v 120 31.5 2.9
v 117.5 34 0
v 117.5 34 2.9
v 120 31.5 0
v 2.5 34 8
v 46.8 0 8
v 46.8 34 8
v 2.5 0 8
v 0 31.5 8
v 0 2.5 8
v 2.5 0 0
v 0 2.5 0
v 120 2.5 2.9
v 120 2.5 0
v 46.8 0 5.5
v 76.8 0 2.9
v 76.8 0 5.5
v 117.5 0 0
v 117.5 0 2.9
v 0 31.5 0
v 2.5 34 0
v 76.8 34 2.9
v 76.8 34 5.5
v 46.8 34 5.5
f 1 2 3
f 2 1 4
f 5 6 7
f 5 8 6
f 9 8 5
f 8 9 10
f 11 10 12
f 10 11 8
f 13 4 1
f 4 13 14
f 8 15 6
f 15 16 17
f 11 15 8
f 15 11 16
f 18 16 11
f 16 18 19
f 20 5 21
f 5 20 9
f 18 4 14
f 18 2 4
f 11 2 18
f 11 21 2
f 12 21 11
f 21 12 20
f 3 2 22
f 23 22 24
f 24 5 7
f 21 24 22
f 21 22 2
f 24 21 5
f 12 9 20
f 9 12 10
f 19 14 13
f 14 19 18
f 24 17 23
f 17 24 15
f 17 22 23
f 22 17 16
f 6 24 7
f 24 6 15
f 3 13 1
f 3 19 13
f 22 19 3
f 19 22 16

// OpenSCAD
$fn = 32;

// ----------------------------------------------------------------------
// Stepped bar: twostep, 120 x 34 x 8/2.9 mm
// ----------------------------------------------------------------------

// --- parameters (mm) ---
bar_l = 120;              // bar length, X
bar_w = 34;               // bar width, Y
plate_t = 8;              // thickness of the thick zone, Z
thin_t = 2.9;             // thickness of the thin zone
corner_c = 2.5;           // corner chamfer of the bar
step_cut = 5.1;           // material removed from the thin zone
stair1_x = 46.8;          // position of the first stair
stair2_x = 76.8;          // position of the second stair
mid_t = 5.5;              // thickness of the middle zone
depth_1 = 2.5;            // depth of cut 1 from the top face
depth_2 = 5.1;            // depth of cut 2 from the top face

profile = [[2.5, 0], [117.5, 0], [120, 2.5], [120, 31.5], [117.5, 34], [2.5, 34], [0, 31.5], [0, 2.5]];  // primary outline, 8 points, counter clockwise
void_1 = [[46.8, -1], [76.8, -1], [76.8, 35], [46.8, 35]];  // first stair, 4 points
void_2 = [[76.8, -1], [121, -1], [121, 35], [76.8, 35]];  // second stair, 4 points

// --- the one profile operation ---
difference() {
  linear_extrude(height = plate_t) polygon(points = profile);
  translate([0, 0, plate_t - depth_1])
    linear_extrude(height = depth_1 + 1) polygon(points = void_1);
  translate([0, 0, plate_t - depth_2])
    linear_extrude(height = depth_2 + 1) polygon(points = void_2);
}
